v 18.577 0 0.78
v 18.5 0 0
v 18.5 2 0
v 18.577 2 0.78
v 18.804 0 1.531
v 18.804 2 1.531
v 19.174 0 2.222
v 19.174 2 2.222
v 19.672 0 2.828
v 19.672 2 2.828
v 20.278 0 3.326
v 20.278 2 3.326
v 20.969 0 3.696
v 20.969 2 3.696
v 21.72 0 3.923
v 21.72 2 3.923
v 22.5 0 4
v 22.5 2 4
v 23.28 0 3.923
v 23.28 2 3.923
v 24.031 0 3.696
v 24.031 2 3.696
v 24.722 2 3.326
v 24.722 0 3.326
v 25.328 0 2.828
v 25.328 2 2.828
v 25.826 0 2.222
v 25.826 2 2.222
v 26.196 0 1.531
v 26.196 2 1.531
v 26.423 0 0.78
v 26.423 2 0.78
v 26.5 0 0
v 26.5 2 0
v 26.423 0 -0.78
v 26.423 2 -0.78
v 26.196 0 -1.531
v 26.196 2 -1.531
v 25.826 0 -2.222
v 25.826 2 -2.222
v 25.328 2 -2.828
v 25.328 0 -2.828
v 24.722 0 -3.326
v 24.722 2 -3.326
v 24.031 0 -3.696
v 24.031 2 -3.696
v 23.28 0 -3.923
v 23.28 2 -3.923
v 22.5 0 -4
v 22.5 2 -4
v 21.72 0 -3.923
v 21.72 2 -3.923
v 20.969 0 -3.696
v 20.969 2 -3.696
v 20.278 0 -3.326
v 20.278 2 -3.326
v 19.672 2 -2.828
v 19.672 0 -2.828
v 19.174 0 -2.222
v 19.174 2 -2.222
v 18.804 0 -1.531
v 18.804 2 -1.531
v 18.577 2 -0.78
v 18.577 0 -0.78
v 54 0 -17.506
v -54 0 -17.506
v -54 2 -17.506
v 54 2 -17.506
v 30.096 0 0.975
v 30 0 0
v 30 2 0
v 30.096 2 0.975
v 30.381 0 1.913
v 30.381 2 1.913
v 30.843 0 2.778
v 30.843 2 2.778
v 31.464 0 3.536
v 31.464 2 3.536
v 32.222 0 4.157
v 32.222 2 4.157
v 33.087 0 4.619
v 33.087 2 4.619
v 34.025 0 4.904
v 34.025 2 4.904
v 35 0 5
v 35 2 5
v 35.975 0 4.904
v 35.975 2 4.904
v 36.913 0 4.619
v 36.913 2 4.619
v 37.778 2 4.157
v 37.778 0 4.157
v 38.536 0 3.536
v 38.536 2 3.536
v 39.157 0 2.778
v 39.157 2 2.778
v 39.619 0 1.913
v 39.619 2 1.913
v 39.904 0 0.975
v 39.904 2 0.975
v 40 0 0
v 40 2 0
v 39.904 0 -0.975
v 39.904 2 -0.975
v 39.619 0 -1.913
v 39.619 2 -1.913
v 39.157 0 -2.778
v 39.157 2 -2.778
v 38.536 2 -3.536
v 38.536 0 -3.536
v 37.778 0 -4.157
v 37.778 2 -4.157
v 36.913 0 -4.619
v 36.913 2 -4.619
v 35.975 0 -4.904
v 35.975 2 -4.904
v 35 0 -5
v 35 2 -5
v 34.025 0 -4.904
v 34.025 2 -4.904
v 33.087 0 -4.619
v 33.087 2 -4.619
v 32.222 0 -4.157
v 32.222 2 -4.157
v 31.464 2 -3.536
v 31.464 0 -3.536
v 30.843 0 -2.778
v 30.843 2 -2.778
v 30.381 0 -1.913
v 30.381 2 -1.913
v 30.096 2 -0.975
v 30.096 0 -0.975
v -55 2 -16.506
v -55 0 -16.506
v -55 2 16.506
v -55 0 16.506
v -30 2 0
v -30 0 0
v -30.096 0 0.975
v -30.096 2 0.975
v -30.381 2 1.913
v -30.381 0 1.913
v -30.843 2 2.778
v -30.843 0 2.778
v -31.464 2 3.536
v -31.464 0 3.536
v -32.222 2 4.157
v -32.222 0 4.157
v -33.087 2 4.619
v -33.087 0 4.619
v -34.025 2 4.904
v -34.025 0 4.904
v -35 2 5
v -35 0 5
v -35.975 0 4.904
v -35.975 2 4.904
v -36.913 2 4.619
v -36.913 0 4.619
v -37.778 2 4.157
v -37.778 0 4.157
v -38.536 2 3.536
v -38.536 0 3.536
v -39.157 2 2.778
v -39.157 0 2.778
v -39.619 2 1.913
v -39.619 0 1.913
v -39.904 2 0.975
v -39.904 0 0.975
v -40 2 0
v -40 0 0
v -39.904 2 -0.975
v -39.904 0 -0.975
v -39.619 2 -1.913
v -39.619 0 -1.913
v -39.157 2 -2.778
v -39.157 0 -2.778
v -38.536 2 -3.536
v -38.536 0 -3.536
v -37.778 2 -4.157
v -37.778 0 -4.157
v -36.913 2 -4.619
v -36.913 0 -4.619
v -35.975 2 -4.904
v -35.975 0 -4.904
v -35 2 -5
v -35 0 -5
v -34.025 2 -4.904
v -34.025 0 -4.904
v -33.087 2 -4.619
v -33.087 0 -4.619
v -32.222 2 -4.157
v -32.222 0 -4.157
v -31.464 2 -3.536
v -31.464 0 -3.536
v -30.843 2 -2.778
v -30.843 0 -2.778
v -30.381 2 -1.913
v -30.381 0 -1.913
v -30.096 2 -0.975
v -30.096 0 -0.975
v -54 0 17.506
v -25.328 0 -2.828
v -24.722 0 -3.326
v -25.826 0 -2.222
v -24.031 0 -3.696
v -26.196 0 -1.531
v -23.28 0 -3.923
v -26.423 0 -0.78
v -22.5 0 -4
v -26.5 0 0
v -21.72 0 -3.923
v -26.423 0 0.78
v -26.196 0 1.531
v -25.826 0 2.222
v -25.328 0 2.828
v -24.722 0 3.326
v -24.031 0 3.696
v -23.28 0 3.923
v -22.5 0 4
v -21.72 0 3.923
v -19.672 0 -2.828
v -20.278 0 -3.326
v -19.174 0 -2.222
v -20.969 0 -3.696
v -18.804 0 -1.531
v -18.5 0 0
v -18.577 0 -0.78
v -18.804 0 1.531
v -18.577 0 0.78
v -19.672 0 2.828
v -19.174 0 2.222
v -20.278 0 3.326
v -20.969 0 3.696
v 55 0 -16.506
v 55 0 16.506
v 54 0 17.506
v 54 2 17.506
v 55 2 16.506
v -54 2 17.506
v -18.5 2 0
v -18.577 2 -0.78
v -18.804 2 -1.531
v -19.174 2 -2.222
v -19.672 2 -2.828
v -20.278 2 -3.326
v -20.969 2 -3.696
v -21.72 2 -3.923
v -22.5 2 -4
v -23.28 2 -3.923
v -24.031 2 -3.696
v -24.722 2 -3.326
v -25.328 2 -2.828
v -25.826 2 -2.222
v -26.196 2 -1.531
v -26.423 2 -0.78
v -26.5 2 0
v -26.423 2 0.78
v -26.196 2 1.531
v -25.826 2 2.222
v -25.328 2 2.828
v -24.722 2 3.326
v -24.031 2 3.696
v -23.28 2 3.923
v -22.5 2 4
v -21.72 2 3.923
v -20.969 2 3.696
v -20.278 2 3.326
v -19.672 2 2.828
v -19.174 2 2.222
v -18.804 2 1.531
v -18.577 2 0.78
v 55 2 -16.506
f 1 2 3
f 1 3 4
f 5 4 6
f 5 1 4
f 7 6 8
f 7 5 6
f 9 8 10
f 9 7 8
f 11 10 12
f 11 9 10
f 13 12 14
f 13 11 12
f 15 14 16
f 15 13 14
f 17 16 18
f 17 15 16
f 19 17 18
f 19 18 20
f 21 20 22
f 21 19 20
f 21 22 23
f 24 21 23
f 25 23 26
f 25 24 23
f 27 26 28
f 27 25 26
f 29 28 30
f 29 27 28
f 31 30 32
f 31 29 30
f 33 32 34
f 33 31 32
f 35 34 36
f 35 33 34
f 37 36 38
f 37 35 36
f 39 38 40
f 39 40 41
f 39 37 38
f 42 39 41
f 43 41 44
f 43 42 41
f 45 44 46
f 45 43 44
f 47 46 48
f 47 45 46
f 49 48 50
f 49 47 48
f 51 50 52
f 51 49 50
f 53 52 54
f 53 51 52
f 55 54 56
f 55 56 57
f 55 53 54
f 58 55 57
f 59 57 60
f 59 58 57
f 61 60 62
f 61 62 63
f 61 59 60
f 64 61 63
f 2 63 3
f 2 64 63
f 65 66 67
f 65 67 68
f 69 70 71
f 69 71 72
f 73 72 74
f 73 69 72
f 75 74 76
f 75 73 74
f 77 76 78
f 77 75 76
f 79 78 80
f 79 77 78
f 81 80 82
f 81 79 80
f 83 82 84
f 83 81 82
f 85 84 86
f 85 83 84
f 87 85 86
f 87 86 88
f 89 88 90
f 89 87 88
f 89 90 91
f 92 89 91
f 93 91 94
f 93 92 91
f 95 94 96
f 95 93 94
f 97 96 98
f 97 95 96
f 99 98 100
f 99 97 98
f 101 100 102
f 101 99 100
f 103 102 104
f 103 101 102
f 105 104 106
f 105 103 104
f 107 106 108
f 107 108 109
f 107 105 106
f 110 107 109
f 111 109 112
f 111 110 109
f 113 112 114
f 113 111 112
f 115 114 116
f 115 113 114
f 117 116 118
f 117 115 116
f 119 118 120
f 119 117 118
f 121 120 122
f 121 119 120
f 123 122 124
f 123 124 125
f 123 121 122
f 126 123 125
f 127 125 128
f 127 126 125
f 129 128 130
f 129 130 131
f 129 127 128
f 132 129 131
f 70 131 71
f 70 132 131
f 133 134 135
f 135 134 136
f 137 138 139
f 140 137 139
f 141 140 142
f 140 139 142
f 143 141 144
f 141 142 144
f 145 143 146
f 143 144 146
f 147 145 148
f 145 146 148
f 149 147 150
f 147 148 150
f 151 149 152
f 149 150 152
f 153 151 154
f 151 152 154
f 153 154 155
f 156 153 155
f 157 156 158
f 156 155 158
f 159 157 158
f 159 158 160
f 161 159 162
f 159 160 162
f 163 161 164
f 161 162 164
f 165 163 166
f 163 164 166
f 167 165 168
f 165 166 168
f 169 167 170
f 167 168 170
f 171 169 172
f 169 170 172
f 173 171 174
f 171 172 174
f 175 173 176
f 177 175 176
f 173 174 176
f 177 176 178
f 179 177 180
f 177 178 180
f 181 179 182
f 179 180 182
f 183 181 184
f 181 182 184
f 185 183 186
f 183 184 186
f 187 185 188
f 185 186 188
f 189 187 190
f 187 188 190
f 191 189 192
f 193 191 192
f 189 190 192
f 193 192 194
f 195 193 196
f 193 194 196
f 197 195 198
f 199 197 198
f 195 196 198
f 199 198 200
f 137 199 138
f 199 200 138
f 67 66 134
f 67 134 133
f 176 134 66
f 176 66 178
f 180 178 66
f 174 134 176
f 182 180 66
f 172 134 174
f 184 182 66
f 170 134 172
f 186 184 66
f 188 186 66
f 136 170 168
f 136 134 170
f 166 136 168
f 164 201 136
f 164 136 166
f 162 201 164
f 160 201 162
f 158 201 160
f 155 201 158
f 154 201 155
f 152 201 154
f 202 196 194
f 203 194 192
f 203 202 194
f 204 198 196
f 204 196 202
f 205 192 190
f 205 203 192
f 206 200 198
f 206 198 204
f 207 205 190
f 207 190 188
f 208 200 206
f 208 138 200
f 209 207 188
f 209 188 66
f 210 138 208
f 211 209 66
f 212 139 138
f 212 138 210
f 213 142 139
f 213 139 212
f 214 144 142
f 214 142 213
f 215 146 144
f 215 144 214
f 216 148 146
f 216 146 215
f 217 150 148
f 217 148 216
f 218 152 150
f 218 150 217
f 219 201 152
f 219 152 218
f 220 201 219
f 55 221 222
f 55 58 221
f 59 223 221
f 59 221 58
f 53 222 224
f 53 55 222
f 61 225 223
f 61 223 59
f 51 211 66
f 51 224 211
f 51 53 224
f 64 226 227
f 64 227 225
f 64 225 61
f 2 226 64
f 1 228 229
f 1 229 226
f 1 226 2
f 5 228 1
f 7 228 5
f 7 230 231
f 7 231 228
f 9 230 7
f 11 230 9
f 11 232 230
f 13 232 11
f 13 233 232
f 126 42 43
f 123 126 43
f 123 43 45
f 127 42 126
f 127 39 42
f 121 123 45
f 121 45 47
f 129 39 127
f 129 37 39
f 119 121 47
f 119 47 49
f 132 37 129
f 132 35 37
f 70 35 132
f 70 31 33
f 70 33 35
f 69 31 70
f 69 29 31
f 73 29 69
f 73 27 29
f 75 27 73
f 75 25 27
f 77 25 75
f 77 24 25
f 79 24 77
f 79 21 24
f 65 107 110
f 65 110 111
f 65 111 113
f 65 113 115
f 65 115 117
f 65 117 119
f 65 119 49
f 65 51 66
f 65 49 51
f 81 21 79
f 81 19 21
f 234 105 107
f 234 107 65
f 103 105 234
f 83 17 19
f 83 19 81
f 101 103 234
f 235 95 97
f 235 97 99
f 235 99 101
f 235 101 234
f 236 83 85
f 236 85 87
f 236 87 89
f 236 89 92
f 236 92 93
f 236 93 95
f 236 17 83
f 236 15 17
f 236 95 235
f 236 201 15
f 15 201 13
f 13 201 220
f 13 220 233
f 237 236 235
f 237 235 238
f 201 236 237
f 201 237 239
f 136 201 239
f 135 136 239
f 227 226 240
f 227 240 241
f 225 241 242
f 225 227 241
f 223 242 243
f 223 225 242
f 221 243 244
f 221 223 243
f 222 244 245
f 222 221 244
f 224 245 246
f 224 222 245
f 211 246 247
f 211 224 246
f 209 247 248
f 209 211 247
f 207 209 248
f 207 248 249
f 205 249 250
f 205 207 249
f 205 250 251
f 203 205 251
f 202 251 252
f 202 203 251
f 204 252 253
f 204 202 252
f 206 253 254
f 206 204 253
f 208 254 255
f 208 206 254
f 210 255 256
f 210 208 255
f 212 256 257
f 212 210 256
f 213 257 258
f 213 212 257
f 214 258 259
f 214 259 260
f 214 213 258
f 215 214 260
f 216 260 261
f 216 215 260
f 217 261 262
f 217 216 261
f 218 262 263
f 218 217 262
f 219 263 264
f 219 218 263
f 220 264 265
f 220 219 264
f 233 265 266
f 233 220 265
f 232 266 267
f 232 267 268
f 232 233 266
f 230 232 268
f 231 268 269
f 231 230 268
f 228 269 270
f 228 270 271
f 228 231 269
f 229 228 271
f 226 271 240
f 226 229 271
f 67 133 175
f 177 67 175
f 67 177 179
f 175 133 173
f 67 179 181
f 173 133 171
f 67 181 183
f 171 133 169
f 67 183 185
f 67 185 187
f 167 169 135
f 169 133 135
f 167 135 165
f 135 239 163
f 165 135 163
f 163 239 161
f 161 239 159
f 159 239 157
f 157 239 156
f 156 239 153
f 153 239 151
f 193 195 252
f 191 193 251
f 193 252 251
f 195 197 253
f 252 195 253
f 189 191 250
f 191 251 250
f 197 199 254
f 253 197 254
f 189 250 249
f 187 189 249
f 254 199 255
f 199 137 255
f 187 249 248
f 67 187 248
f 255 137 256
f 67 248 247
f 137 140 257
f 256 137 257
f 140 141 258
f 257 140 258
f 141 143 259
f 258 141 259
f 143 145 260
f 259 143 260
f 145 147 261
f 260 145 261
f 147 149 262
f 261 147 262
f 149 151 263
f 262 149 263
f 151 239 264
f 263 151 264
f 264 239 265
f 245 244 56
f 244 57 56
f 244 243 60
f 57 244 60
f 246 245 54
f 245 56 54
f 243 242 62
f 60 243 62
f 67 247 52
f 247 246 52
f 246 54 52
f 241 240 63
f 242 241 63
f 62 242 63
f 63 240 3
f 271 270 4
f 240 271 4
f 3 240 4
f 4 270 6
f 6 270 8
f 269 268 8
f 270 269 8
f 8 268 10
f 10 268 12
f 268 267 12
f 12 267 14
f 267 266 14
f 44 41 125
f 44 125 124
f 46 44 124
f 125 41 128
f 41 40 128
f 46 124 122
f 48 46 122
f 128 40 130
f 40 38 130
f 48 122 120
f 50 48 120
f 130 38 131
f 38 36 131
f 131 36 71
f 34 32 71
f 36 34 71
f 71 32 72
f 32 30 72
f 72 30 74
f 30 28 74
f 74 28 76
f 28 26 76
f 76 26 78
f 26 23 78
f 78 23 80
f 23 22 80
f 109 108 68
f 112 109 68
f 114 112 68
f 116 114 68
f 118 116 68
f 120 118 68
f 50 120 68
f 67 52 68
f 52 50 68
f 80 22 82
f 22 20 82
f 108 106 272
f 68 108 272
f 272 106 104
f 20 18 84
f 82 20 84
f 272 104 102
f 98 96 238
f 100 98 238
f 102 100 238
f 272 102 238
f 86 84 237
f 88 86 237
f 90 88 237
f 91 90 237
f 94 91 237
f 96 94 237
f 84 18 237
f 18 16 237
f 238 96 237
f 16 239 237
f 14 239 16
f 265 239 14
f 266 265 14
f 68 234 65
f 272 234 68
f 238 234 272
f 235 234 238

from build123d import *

# Parameters (mm, degrees)
F0_W     = 10
F0_H     = 35.0110880776
F0_W_2   = 90
F0_R     = 5
F1_DEPTH = 2
F2_SIZE  = 1


with BuildPart() as f1:
    # F0 (on Front) → F1 (new body)
    with BuildSketch(Plane.XZ):
        with Locations((-50, 0)):
            Rectangle(F0_W, F0_H)
        Rectangle(F0_W_2, F0_H)
        with Locations((-35, 0)):
            Circle(F0_R, mode=Mode.SUBTRACT)
        with BuildLine():
            ThreePointArc((-26.5, 0), (-22.5, 4), (-18.5, 0))
            ThreePointArc((-18.5, 0), (-22.5, -4), (-26.5, 0))
        make_face(mode=Mode.SUBTRACT)
        with BuildLine():
            ThreePointArc((26.5, 0), (22.5, -4), (18.5, 0))
            ThreePointArc((18.5, 0), (22.5, 4), (26.5, 0))
        make_face(mode=Mode.SUBTRACT)
        with BuildLine():
            ThreePointArc((40, 0), (35, -5), (30, 0))
            ThreePointArc((30, 0), (35, 5), (40, 0))
        make_face(mode=Mode.SUBTRACT)
        with Locations((50, 0)):
            Rectangle(F0_W, F0_H)
    extrude(amount=-F1_DEPTH)

    # F2
    f2_edges = [f1.edges().sort_by_distance(p)[0] for p in [
        (55, 1, 17.505544),
        (55, 1, -17.505544),
        (-55, 1, -17.505544),
        (-55, 1, 17.505544),
    ]]
    chamfer(f2_edges, length=F2_SIZE)


solid = f1.part
